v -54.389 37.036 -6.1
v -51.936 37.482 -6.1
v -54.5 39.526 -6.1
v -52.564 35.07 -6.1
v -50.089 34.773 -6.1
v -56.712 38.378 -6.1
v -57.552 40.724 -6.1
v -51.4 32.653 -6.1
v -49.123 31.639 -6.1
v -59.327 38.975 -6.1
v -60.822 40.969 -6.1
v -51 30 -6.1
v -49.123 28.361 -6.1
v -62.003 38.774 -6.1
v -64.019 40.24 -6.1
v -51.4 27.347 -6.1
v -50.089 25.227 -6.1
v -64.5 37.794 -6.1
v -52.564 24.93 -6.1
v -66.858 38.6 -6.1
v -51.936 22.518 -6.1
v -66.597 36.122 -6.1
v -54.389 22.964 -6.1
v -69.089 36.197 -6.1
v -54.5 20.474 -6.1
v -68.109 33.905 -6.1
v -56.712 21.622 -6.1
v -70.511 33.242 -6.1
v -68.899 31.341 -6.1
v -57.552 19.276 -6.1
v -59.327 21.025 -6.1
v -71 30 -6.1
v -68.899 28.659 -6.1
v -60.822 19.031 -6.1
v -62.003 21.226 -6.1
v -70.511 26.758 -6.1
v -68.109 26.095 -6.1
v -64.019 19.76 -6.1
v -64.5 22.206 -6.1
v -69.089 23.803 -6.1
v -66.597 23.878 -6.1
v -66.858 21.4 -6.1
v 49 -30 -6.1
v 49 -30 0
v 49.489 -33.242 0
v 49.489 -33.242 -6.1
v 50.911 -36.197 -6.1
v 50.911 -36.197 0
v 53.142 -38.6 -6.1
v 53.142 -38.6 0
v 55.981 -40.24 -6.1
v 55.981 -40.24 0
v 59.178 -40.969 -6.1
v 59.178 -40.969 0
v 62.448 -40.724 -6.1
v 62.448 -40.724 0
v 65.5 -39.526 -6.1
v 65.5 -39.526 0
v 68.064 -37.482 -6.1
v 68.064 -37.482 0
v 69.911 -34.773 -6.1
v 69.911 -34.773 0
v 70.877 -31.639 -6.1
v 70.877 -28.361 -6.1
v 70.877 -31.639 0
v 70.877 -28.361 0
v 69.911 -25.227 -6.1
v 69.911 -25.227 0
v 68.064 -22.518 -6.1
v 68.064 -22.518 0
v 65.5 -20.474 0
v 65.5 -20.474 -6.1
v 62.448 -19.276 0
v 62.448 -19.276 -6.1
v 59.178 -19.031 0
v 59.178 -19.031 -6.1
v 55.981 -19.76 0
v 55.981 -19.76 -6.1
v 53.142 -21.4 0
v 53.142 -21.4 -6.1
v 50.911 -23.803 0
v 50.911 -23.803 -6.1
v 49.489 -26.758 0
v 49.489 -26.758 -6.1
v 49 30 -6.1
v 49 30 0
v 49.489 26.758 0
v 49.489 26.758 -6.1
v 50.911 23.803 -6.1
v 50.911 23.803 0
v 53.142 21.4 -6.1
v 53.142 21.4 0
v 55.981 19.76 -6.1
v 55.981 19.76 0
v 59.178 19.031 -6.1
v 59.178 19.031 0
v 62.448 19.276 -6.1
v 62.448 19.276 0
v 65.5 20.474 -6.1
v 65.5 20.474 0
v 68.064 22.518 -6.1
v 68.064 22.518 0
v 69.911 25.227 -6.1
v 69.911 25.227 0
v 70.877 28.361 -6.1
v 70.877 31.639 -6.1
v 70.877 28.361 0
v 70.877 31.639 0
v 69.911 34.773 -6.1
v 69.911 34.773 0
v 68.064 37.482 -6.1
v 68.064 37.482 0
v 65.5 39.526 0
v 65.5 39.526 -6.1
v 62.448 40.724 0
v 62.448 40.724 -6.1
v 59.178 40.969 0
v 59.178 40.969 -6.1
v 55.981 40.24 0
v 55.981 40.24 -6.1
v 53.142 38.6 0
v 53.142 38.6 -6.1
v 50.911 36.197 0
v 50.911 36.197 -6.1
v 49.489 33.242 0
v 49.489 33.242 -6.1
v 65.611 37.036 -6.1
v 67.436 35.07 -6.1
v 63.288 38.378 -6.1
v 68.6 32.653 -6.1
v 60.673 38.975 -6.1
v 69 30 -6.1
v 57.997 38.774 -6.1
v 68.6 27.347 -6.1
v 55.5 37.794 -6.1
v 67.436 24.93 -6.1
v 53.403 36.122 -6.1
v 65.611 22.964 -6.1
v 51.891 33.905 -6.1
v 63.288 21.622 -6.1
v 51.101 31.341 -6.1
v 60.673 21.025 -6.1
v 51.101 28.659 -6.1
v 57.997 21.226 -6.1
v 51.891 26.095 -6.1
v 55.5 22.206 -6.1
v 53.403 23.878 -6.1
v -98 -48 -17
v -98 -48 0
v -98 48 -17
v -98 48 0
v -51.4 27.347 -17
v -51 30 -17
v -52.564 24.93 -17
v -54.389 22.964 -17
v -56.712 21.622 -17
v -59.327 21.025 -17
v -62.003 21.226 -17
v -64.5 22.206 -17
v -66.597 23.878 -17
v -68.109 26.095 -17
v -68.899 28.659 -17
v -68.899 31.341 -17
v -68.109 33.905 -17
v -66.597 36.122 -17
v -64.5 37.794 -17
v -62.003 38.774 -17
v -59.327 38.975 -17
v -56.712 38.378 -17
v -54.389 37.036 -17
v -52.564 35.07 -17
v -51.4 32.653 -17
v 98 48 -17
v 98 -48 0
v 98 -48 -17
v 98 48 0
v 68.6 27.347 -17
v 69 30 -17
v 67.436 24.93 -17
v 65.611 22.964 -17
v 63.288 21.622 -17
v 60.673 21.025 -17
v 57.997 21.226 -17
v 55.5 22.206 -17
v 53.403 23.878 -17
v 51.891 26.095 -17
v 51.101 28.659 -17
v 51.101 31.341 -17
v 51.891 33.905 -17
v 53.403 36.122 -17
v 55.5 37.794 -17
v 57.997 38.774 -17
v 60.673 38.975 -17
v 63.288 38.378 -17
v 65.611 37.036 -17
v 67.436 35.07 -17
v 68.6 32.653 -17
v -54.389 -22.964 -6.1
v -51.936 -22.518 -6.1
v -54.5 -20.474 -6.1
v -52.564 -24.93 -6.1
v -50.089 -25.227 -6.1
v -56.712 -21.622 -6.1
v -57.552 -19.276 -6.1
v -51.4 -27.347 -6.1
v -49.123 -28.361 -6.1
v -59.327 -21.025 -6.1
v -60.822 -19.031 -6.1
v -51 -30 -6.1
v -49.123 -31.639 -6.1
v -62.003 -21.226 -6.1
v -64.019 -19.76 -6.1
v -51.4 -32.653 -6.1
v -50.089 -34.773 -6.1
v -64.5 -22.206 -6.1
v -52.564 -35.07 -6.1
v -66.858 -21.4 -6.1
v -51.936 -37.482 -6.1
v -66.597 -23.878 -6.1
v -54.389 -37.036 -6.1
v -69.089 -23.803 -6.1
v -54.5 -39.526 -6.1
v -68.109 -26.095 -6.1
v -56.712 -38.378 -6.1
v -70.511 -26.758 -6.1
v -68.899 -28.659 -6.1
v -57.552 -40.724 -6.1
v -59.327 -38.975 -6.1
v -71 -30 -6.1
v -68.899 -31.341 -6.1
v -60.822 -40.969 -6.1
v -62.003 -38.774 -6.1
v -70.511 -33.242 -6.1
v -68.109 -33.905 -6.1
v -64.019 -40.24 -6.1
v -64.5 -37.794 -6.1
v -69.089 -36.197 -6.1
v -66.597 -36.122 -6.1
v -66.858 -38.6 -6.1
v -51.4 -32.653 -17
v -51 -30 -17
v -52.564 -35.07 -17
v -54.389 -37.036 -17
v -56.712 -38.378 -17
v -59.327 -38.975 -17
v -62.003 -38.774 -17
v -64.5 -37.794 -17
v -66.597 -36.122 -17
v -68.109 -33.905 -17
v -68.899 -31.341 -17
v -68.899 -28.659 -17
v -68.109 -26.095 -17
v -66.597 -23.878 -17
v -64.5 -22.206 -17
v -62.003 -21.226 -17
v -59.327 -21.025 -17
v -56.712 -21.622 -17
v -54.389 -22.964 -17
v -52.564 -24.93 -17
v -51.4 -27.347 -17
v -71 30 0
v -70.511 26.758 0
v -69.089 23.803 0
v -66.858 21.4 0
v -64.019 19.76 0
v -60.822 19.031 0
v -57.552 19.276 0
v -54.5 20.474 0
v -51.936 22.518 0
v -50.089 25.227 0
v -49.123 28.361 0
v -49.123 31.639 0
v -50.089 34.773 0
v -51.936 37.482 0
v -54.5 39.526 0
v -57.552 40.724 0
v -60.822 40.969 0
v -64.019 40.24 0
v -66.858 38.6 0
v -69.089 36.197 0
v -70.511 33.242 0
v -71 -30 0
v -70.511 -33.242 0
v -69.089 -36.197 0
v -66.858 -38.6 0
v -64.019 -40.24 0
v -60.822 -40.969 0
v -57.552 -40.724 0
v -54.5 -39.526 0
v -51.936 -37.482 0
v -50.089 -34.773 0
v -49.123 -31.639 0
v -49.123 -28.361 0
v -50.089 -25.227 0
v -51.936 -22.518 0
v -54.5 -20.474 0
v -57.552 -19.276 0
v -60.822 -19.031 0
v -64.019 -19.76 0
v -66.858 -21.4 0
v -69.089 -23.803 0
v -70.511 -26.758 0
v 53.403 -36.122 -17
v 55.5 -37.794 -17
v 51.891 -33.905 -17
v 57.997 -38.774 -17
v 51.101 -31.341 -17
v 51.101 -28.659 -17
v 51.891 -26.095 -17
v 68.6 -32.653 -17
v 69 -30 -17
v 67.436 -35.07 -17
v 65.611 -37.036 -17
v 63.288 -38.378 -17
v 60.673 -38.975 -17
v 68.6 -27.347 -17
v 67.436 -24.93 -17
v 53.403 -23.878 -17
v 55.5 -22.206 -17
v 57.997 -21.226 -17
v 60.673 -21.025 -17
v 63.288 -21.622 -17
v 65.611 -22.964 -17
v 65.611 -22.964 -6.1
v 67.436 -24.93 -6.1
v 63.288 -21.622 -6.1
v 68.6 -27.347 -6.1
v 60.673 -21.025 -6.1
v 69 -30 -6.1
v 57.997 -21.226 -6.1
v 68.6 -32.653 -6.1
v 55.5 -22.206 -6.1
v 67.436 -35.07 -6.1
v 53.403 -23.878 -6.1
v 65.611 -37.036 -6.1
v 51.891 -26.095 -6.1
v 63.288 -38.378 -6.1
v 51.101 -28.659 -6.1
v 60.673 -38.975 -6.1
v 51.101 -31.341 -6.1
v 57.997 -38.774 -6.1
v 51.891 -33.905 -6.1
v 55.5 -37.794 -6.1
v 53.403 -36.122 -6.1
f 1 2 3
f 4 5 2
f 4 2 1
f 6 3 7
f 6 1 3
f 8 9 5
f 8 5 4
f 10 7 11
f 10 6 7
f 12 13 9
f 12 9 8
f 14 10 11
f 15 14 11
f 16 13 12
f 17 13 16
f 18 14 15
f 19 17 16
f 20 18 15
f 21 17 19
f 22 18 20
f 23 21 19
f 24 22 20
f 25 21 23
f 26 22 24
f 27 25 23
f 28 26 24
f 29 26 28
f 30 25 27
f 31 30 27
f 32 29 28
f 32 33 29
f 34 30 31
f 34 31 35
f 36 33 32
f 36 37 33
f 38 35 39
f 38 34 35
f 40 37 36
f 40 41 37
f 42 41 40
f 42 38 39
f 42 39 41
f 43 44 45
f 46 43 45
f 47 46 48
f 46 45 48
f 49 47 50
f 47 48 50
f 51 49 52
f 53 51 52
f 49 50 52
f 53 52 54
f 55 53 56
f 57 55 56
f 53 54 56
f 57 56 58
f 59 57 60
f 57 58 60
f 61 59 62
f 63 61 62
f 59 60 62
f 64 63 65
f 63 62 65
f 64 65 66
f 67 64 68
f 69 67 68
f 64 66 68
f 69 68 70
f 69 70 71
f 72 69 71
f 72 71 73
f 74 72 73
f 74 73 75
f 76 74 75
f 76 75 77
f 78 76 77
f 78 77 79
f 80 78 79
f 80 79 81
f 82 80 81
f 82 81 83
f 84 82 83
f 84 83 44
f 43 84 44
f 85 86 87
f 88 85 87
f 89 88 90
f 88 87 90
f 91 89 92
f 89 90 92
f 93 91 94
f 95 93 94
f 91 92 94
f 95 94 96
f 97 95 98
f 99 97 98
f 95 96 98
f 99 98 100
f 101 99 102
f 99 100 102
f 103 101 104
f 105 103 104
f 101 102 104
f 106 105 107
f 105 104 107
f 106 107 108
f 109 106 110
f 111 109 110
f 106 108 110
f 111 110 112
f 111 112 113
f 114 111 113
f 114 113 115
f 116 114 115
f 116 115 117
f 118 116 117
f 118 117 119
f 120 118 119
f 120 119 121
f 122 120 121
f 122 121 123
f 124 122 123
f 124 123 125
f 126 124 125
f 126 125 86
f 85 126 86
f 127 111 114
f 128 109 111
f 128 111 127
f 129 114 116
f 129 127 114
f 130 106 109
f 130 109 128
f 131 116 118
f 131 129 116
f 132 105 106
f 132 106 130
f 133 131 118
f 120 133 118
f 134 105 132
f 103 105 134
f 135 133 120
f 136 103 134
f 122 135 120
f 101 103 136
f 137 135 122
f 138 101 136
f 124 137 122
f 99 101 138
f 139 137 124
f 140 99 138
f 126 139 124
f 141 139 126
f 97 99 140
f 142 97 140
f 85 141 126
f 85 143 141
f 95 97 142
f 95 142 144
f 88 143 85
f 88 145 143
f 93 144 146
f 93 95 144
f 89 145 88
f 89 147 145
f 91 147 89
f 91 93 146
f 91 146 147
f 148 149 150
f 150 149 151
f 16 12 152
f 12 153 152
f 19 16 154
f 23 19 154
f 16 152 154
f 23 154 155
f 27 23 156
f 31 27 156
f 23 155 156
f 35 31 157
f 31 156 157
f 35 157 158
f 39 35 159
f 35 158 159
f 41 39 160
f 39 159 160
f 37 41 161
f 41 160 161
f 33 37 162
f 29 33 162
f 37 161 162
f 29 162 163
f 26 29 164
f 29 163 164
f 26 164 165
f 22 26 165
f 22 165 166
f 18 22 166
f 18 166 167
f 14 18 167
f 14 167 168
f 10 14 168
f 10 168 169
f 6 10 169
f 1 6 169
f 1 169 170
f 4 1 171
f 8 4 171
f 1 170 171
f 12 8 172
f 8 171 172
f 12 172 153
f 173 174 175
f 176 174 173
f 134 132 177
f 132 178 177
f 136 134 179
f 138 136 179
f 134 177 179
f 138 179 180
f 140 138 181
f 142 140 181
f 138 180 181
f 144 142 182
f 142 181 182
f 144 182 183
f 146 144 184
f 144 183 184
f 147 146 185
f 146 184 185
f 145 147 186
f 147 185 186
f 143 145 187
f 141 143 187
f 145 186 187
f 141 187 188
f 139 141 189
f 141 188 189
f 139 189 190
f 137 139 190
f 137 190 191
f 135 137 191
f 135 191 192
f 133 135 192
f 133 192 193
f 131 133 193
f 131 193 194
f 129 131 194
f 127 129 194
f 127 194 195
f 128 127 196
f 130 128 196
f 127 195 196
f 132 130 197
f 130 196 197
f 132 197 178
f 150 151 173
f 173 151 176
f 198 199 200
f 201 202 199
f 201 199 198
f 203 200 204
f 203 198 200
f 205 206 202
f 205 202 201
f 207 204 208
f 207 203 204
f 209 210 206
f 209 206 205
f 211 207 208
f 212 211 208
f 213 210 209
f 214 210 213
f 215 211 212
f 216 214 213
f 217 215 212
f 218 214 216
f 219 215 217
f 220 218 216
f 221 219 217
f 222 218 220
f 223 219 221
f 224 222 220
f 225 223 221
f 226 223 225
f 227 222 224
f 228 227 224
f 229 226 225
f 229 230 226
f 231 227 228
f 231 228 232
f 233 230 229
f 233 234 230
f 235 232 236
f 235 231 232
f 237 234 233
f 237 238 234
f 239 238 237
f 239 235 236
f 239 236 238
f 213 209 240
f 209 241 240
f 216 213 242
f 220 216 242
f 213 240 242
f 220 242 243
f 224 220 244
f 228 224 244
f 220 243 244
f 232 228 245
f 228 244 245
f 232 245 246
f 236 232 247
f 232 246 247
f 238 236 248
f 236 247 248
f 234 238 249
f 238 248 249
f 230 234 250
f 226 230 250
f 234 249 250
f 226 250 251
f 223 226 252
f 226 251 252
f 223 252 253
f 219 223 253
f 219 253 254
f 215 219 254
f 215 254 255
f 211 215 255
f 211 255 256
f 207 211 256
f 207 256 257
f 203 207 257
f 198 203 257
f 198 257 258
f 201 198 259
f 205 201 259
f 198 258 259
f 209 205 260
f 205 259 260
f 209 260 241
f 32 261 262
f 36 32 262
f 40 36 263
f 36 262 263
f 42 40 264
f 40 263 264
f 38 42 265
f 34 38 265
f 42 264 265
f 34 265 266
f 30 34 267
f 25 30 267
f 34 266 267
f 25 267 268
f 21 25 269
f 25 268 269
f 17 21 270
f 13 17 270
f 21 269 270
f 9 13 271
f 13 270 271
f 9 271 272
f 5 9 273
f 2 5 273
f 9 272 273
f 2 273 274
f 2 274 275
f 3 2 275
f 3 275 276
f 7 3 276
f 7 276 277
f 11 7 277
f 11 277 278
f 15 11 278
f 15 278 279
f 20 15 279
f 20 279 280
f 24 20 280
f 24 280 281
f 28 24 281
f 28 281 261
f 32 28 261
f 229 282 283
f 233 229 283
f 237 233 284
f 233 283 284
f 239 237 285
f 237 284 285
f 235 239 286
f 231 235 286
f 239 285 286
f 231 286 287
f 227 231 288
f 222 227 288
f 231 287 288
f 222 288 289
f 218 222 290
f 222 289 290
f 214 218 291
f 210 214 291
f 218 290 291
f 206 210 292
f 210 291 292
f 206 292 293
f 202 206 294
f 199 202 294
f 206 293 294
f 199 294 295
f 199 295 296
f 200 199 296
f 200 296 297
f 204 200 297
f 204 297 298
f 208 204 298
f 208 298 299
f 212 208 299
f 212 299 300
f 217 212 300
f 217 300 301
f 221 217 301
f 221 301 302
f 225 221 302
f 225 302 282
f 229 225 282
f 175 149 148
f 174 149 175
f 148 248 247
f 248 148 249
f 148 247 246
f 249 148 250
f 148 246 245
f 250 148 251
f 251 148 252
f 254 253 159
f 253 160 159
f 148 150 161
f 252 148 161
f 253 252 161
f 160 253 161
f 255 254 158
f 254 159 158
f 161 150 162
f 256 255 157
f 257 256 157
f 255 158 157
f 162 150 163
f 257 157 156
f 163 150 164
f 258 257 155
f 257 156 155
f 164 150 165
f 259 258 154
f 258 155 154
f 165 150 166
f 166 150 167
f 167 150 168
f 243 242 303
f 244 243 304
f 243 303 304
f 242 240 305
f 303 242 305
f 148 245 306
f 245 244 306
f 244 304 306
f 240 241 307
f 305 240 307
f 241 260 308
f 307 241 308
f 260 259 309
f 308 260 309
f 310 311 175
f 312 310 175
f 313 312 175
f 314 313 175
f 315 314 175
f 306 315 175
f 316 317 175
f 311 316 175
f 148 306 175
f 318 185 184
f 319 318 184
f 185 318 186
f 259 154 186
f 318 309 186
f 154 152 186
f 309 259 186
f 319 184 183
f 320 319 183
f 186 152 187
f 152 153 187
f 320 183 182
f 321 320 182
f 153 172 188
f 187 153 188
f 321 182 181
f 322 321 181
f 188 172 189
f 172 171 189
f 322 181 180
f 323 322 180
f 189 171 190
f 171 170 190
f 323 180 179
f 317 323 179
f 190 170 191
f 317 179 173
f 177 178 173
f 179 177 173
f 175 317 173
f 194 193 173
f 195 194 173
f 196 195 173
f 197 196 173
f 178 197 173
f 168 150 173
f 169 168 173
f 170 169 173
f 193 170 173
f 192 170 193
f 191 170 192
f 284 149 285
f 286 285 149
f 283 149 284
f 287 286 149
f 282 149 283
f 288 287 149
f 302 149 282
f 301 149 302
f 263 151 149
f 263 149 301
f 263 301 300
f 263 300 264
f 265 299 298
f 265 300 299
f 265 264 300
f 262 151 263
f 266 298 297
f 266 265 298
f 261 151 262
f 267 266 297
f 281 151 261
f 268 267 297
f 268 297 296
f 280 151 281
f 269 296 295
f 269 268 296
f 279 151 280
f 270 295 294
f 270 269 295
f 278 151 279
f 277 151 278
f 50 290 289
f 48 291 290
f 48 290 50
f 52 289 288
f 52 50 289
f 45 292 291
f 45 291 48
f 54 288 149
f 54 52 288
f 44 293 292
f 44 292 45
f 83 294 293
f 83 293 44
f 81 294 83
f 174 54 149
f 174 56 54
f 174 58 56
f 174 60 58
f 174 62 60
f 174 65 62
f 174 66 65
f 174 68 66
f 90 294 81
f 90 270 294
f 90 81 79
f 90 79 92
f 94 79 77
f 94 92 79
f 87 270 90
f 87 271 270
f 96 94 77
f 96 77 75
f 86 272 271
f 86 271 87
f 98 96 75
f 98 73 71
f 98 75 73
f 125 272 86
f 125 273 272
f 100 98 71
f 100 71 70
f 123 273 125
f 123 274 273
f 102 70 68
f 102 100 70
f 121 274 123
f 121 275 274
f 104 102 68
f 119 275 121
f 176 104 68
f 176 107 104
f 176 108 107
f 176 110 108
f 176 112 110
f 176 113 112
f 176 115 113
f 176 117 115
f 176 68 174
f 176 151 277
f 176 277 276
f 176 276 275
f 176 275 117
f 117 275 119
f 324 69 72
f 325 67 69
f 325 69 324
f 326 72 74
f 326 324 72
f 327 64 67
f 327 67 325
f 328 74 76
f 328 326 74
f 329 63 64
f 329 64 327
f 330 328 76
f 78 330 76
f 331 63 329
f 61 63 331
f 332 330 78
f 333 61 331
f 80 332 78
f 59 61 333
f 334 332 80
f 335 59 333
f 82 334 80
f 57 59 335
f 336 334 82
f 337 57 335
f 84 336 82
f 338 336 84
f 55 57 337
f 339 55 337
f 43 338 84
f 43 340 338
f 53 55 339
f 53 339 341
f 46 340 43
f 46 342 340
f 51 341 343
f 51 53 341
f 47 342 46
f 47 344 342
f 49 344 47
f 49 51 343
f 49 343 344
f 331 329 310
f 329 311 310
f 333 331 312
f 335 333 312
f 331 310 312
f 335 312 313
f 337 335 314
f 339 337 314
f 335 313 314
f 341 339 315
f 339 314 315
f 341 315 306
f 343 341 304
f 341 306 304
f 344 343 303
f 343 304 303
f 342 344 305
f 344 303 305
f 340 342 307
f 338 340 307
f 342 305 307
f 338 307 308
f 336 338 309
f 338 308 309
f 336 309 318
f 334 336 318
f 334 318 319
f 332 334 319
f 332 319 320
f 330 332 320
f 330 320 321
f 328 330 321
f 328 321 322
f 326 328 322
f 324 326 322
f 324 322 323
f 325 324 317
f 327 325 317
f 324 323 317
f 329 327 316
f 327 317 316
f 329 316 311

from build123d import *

# Parameters (mm, degrees)
SKETCH1_W                                           = 196
SKETCH1_H                                           = 96
EXTRUDE1_DEPTH                                      = 17
CBORE_FOR_14_MM_LOCATING_GUIDE_BUSHING1_D           = 18
CBORE_FOR_14_MM_LOCATING_GUIDE_BUSHING1_CBORE_D     = 22
CBORE_FOR_14_MM_LOCATING_GUIDE_BUSHING1_CBORE_DEPTH = 6.1


with BuildPart() as part:
    # Sketch1 → Extrude1 (new body)
    with BuildSketch(Plane.XY):
        Rectangle(SKETCH1_W, SKETCH1_H)
    extrude(amount=-EXTRUDE1_DEPTH)

    # CBORE for 14 mm Locating Guide Bushing1 (through all)
    with Locations(Plane(origin=(49.246098405, -1.095802974, 0), x_dir=(-1, 0, 0), z_dir=(0, 0, 1))):
        with Locations((-10.753901595, -31.095802974), (109.246098405, -31.095802974), (109.246098405, 28.904197026), (-10.753901595, 28.904197026)):
            CounterBoreHole(CBORE_FOR_14_MM_LOCATING_GUIDE_BUSHING1_D / 2, CBORE_FOR_14_MM_LOCATING_GUIDE_BUSHING1_CBORE_D / 2, CBORE_FOR_14_MM_LOCATING_GUIDE_BUSHING1_CBORE_DEPTH)


solid = part.part
